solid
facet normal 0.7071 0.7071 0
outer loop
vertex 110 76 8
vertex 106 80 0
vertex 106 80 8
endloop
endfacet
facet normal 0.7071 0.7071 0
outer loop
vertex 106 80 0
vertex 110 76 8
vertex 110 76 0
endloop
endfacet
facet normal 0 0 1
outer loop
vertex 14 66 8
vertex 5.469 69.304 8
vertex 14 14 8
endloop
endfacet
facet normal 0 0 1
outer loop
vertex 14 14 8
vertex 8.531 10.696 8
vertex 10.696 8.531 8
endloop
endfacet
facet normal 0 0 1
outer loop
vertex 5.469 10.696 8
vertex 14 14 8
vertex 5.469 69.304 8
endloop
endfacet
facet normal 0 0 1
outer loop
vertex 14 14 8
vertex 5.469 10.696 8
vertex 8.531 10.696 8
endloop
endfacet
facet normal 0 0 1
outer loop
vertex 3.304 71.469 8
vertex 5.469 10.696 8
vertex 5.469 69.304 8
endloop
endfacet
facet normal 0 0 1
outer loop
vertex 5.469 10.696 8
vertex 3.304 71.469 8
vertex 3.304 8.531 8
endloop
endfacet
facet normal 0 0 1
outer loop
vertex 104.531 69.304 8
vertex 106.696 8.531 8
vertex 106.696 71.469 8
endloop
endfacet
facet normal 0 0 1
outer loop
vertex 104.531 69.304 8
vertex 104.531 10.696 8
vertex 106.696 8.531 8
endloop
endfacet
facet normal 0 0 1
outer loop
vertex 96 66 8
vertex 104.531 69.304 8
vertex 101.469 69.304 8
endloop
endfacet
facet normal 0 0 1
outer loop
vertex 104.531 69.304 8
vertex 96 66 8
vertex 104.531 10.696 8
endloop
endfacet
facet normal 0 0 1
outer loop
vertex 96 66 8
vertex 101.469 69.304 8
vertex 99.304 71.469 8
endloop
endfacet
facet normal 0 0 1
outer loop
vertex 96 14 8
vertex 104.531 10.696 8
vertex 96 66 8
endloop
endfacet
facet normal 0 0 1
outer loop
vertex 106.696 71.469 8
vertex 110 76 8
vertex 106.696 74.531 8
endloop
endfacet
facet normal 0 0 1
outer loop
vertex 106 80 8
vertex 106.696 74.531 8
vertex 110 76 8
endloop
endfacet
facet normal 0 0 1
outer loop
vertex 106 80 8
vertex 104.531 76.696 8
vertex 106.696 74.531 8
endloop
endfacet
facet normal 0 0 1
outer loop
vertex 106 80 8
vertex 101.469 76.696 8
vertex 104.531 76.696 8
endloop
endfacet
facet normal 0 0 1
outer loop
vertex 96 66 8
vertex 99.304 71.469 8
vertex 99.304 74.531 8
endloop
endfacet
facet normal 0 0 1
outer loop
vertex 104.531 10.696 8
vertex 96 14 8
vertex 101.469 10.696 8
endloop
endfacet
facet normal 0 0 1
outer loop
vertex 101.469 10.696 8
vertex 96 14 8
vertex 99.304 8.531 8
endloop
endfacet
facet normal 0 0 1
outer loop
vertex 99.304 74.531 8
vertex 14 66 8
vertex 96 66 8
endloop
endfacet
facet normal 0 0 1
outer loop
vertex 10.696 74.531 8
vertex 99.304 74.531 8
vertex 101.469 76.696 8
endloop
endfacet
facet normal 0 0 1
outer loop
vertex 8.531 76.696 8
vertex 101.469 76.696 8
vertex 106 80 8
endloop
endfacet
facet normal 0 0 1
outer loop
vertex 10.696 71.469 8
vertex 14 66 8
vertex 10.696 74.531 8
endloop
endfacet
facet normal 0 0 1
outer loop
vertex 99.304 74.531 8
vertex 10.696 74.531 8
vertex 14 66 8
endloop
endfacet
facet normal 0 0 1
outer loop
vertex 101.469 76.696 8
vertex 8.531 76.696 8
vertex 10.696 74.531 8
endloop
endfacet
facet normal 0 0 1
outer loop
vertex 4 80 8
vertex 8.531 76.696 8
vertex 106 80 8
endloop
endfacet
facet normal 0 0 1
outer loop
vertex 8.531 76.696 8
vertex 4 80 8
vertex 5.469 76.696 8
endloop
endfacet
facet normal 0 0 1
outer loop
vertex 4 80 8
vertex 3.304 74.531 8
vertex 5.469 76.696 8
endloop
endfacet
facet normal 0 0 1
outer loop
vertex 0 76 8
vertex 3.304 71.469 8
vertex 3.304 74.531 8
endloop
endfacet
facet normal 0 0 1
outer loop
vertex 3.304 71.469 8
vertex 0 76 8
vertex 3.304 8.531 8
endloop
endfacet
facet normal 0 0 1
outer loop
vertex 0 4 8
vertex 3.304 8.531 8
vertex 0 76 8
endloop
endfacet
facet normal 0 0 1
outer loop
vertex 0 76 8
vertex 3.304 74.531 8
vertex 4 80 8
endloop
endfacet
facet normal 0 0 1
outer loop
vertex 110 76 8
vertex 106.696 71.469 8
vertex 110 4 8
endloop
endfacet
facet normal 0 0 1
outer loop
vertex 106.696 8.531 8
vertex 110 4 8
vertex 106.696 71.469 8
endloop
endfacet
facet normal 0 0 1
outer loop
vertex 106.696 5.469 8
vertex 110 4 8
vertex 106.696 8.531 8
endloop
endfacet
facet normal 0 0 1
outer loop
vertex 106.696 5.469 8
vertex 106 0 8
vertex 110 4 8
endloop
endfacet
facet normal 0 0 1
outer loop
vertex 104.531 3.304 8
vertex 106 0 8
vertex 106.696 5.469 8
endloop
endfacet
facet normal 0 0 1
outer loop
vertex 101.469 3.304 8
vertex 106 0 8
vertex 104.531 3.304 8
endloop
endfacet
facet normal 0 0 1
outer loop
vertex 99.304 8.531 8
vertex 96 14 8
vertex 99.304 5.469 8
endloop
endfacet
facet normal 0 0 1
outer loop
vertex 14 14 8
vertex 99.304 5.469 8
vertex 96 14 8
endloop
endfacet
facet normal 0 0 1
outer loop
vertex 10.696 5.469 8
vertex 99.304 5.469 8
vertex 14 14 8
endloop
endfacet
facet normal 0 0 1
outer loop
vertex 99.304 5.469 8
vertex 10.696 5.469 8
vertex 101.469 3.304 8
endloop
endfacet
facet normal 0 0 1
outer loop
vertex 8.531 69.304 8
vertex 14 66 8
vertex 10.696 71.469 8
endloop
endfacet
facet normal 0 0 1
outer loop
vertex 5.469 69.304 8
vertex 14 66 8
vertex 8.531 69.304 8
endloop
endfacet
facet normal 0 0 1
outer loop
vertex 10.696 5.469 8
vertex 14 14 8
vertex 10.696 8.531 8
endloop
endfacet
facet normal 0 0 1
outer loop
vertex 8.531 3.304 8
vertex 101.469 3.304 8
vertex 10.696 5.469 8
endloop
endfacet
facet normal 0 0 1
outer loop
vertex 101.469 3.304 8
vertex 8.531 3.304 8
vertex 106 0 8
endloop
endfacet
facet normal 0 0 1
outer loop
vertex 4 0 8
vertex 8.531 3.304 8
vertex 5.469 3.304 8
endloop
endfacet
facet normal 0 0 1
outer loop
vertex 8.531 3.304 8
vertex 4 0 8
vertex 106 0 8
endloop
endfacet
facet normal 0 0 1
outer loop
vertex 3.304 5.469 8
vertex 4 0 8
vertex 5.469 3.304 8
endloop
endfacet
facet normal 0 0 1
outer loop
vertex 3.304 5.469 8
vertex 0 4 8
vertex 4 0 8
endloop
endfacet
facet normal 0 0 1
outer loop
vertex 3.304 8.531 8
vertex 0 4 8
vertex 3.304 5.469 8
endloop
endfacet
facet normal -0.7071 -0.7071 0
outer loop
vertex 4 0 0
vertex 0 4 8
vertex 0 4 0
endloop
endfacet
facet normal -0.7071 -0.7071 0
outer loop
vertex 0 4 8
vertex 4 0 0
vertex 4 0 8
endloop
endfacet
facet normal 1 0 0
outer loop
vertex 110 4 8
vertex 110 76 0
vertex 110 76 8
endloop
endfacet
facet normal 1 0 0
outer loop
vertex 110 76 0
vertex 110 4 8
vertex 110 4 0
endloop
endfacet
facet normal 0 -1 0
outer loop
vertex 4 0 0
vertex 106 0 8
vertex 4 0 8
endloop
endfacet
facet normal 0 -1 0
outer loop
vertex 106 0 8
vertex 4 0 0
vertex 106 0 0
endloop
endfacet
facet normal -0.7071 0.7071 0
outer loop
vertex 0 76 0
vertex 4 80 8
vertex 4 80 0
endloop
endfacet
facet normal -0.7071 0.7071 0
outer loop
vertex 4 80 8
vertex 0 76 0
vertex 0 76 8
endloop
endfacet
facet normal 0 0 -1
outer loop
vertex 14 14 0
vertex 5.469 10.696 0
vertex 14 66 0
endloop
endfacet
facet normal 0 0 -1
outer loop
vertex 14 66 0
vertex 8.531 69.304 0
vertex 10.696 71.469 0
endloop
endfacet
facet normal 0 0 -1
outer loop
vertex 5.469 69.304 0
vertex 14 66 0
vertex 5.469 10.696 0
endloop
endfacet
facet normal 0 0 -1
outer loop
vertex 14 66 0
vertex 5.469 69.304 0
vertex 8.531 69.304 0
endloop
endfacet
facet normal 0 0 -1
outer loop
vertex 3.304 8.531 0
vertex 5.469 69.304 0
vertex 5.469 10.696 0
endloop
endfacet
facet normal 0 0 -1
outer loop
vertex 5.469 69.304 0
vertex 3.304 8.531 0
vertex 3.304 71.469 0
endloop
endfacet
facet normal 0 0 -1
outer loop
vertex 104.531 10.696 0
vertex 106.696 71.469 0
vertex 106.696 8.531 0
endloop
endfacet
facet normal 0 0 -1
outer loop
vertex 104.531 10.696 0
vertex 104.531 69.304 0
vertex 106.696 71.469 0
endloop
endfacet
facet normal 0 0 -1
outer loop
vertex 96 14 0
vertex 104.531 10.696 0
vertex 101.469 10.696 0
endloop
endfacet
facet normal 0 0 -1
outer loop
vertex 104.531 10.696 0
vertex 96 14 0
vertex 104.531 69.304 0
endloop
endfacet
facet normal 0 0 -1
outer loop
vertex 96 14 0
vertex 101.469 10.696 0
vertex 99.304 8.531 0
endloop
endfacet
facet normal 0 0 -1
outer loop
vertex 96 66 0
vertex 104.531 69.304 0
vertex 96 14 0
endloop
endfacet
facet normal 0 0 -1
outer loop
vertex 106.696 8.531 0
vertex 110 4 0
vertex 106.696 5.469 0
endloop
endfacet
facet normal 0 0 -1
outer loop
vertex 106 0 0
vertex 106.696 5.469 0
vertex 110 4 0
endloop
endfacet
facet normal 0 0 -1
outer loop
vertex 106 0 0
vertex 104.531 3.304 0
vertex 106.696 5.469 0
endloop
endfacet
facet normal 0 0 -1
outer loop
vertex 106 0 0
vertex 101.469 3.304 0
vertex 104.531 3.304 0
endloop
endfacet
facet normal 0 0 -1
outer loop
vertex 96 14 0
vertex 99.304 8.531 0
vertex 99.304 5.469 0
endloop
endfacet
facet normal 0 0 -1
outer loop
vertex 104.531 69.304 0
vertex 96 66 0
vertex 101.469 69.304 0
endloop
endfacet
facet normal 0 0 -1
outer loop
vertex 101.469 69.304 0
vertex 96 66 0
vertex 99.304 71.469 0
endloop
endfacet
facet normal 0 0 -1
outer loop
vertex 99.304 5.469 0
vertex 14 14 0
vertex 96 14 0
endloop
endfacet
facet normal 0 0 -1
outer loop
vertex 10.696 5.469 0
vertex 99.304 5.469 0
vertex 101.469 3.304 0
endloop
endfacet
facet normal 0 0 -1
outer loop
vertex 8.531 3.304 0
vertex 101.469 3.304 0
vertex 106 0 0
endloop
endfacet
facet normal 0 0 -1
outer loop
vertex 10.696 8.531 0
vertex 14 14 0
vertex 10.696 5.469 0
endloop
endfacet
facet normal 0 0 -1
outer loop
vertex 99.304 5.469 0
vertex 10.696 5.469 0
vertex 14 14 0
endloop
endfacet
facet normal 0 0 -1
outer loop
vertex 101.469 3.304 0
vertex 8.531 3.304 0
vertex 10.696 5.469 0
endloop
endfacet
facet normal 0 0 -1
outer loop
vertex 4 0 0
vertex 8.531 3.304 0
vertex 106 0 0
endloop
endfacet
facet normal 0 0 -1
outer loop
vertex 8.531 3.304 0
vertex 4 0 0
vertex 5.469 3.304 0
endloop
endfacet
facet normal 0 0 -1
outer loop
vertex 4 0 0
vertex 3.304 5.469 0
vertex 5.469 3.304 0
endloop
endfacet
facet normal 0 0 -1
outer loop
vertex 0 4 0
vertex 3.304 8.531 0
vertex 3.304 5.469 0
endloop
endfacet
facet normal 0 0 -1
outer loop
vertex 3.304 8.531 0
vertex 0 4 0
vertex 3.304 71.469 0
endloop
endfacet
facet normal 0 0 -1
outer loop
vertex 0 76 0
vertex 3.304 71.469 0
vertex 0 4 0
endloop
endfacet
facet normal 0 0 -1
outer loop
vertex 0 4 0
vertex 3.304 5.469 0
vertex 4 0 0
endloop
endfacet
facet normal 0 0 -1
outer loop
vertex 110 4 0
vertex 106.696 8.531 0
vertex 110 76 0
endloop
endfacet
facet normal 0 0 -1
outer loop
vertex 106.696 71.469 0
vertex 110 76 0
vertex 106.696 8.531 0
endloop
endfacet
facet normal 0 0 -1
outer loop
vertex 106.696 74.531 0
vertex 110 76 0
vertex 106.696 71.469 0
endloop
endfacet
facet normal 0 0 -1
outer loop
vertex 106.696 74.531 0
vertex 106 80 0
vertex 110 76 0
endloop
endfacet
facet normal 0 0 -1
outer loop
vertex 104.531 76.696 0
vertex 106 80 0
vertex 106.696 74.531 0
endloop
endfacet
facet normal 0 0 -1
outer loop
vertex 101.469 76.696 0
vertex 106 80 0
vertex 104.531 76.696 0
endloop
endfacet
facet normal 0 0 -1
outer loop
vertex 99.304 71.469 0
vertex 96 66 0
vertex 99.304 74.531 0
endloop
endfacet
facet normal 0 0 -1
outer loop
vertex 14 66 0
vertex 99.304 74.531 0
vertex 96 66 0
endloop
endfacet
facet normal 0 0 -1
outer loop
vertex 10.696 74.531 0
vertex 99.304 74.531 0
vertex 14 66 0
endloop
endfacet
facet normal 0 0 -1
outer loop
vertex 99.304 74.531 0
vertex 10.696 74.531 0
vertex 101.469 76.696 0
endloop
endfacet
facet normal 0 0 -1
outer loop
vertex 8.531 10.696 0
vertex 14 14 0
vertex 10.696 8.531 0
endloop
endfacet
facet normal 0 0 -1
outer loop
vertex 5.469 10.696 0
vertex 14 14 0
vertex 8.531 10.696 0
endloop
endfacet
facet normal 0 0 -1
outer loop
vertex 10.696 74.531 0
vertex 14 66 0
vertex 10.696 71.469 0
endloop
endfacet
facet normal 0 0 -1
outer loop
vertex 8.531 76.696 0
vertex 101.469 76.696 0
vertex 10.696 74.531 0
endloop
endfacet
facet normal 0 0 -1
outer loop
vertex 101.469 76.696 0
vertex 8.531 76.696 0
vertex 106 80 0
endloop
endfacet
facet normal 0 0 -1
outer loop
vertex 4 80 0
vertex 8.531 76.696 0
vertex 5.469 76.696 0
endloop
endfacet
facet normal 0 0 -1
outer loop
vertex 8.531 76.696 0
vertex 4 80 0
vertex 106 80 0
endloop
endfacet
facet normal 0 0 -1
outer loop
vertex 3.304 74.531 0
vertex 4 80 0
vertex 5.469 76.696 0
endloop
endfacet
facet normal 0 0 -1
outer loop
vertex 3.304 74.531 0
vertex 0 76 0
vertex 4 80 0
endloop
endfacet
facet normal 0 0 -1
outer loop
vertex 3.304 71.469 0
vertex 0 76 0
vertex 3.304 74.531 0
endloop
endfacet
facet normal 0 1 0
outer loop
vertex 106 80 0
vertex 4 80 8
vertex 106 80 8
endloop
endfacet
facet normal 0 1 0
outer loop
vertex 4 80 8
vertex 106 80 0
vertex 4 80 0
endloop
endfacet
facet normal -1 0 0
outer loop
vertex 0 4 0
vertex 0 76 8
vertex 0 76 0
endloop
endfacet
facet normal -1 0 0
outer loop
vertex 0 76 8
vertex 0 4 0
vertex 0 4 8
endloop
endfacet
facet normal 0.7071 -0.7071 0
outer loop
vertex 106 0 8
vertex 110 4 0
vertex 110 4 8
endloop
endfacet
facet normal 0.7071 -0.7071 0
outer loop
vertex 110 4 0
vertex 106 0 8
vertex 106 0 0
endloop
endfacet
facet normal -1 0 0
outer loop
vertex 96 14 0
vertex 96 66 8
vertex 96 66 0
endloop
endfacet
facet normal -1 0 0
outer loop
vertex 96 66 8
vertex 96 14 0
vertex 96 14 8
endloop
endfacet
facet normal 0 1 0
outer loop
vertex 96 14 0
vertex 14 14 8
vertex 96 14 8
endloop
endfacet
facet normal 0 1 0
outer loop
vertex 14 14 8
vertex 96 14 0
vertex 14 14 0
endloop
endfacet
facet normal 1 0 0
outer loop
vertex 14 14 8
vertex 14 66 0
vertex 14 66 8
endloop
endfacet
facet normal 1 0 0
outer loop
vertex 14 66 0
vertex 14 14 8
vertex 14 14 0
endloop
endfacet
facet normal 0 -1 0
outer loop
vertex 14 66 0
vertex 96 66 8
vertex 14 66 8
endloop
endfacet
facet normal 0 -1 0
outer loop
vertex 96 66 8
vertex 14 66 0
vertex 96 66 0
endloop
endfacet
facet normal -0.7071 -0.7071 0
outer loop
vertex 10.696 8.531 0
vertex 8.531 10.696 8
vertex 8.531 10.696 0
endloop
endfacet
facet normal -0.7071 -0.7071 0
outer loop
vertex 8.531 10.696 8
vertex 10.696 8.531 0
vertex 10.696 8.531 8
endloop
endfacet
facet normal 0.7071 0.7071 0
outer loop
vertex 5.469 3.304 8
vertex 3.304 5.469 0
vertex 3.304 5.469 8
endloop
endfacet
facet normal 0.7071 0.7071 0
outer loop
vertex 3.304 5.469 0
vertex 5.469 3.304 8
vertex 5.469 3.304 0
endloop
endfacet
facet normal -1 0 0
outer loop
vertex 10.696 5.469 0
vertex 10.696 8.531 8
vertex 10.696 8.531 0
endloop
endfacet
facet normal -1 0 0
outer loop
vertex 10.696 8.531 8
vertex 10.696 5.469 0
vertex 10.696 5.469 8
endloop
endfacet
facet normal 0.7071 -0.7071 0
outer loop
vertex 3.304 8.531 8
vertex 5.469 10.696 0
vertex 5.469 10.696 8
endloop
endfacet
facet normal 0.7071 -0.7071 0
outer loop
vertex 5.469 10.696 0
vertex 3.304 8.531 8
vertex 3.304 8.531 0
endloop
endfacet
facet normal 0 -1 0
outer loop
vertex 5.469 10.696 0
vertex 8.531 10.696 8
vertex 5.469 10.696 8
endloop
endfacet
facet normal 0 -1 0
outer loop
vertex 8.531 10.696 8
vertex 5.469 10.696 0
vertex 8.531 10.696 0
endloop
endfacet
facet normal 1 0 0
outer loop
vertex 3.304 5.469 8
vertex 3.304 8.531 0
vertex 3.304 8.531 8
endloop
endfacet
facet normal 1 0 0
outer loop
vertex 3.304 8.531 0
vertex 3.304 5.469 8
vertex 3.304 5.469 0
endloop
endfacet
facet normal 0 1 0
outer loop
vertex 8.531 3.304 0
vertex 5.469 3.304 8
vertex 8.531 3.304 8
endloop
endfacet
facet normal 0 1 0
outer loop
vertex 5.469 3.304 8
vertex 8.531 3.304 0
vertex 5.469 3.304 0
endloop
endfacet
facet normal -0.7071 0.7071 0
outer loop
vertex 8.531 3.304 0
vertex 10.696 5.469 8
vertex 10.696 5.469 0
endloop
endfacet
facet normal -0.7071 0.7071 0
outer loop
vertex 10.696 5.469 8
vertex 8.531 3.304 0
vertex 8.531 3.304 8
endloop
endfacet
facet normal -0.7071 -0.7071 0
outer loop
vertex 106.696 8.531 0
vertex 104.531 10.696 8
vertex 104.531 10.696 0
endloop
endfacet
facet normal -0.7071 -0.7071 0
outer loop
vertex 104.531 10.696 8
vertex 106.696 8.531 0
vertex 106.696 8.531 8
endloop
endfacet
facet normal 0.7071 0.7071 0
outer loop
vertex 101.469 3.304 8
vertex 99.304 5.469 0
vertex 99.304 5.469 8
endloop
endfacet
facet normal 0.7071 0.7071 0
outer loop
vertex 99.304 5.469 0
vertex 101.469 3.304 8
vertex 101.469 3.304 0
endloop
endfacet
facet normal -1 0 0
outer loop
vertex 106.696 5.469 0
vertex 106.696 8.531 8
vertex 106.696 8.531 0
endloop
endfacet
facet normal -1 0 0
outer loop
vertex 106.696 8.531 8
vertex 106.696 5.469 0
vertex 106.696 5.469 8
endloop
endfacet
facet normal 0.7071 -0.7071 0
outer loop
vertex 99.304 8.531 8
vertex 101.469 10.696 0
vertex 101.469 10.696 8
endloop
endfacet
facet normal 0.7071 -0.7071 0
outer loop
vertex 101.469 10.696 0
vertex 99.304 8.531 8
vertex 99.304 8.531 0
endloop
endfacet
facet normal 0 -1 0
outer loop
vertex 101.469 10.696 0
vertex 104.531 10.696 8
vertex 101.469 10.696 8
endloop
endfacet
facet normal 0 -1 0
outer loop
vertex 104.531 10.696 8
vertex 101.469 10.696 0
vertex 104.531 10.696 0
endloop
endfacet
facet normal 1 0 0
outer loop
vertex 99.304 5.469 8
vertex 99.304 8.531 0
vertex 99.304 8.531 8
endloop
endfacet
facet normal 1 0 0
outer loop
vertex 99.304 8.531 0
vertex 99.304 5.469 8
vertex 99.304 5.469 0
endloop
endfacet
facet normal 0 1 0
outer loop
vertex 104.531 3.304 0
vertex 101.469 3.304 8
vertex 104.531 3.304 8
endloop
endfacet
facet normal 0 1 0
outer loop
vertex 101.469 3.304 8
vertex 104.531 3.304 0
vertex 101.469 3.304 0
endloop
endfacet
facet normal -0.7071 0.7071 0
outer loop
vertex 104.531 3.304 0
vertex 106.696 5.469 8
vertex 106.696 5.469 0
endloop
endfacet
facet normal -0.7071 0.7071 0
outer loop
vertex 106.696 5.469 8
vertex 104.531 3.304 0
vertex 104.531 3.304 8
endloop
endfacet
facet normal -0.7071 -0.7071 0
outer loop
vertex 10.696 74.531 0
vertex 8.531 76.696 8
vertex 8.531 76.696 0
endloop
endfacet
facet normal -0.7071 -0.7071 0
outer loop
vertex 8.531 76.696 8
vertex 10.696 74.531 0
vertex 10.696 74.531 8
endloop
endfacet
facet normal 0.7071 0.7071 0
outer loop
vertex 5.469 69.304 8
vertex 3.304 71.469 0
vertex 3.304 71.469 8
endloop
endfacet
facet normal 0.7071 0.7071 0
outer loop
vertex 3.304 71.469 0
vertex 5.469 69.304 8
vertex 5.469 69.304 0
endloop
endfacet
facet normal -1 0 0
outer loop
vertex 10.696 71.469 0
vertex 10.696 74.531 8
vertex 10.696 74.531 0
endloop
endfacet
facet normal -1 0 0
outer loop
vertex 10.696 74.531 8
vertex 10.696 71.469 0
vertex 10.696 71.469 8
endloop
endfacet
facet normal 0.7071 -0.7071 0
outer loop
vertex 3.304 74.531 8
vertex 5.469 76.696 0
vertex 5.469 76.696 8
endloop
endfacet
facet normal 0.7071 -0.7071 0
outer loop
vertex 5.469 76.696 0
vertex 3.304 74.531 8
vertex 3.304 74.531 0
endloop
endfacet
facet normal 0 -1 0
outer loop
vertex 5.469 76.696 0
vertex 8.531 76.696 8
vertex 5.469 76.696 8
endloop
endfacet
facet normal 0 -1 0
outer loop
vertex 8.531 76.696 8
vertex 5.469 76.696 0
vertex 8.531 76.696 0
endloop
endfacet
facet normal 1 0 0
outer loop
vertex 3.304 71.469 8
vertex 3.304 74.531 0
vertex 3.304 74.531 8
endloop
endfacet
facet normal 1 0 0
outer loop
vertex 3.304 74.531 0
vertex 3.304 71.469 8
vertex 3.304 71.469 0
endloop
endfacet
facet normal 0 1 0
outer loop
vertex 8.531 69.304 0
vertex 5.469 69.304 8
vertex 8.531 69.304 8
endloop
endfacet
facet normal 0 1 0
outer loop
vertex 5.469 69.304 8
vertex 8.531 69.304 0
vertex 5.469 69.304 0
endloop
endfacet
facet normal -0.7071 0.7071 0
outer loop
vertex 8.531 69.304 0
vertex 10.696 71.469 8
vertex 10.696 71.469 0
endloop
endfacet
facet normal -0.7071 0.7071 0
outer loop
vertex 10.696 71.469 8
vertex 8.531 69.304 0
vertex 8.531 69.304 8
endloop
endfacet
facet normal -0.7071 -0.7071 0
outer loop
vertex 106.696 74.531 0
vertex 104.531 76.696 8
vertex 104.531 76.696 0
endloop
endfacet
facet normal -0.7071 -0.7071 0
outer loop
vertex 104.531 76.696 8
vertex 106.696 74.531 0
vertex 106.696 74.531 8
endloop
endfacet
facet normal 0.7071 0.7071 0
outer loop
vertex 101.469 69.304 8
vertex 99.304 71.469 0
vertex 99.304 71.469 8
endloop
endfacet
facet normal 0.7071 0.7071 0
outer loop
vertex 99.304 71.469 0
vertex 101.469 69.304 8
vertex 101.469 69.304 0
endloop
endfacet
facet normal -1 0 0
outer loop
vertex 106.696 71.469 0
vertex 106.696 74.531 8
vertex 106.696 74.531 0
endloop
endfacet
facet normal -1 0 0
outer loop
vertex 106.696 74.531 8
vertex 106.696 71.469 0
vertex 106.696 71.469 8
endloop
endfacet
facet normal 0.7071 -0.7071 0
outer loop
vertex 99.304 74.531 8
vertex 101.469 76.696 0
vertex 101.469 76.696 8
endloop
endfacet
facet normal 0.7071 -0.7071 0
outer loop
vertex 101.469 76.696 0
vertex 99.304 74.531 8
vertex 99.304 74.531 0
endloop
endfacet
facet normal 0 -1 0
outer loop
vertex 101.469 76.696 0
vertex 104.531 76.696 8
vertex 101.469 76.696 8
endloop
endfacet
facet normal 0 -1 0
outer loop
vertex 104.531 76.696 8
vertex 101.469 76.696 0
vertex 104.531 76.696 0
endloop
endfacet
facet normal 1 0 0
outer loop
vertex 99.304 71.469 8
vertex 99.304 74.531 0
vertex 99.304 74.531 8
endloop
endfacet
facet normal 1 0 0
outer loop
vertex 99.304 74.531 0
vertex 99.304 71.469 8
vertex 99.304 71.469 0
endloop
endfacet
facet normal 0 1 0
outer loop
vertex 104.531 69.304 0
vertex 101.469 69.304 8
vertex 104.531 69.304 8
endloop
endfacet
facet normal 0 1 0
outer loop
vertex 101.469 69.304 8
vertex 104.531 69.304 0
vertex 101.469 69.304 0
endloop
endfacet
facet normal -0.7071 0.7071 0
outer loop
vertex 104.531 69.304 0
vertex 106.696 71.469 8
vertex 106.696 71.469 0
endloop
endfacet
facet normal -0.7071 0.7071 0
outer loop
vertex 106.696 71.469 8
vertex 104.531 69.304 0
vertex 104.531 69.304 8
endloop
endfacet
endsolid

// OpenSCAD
$fn = 32;

// ----------------------------------------------------------------------
// Frame plate: 110 x 80 frame, 14 mm rails
// ----------------------------------------------------------------------

// --- parameters (mm) ---
plate_l = 110;            // plate length, X
plate_w = 80;             // plate width, Y
plate_t = 8;              // plate thickness, Z (extrusion height)
corner_c = 4;             // corner chamfer
frame_bar = 14;           // frame rail width
bolt_r = 4;               // corner bolt window radius
bolt_inset = 7;           // bolt centre inset from the edges

win_l = plate_l - 2 * frame_bar;  // window length
win_w = plate_w - 2 * frame_bar;  // window width
bolt_d = 2 * bolt_r;  // corner hole diameter

profile = [[4, 0], [106, 0], [110, 4], [110, 76], [106, 80], [4, 80], [0, 76], [0, 4]];  // primary outline, 8 points, counter clockwise
void_1 = [[14, 14], [96, 14], [96, 66], [14, 66]];  // the window, 4 points
void_2 = [[10.696, 8.531], [8.531, 10.696], [5.469, 10.696], [3.304, 8.531], [3.304, 5.469], [5.469, 3.304], [8.531, 3.304], [10.696, 5.469]];  // corner bolt window, 8 points
void_3 = [[106.696, 8.531], [104.531, 10.696], [101.469, 10.696], [99.304, 8.531], [99.304, 5.469], [101.469, 3.304], [104.531, 3.304], [106.696, 5.469]];  // corner bolt window, 8 points
void_4 = [[10.696, 74.531], [8.531, 76.696], [5.469, 76.696], [3.304, 74.531], [3.304, 71.469], [5.469, 69.304], [8.531, 69.304], [10.696, 71.469]];  // corner bolt window, 8 points
void_5 = [[106.696, 74.531], [104.531, 76.696], [101.469, 76.696], [99.304, 74.531], [99.304, 71.469], [101.469, 69.304], [104.531, 69.304], [106.696, 71.469]];  // corner bolt window, 8 points

// --- the one profile operation ---
difference() {
  linear_extrude(height = plate_t) polygon(points = profile);
  translate([0, 0, -1])
    linear_extrude(height = plate_t + 2) polygon(points = void_1);
  translate([0, 0, -1])
    linear_extrude(height = plate_t + 2) polygon(points = void_2);
  translate([0, 0, -1])
    linear_extrude(height = plate_t + 2) polygon(points = void_3);
  translate([0, 0, -1])
    linear_extrude(height = plate_t + 2) polygon(points = void_4);
  translate([0, 0, -1])
    linear_extrude(height = plate_t + 2) polygon(points = void_5);
}
